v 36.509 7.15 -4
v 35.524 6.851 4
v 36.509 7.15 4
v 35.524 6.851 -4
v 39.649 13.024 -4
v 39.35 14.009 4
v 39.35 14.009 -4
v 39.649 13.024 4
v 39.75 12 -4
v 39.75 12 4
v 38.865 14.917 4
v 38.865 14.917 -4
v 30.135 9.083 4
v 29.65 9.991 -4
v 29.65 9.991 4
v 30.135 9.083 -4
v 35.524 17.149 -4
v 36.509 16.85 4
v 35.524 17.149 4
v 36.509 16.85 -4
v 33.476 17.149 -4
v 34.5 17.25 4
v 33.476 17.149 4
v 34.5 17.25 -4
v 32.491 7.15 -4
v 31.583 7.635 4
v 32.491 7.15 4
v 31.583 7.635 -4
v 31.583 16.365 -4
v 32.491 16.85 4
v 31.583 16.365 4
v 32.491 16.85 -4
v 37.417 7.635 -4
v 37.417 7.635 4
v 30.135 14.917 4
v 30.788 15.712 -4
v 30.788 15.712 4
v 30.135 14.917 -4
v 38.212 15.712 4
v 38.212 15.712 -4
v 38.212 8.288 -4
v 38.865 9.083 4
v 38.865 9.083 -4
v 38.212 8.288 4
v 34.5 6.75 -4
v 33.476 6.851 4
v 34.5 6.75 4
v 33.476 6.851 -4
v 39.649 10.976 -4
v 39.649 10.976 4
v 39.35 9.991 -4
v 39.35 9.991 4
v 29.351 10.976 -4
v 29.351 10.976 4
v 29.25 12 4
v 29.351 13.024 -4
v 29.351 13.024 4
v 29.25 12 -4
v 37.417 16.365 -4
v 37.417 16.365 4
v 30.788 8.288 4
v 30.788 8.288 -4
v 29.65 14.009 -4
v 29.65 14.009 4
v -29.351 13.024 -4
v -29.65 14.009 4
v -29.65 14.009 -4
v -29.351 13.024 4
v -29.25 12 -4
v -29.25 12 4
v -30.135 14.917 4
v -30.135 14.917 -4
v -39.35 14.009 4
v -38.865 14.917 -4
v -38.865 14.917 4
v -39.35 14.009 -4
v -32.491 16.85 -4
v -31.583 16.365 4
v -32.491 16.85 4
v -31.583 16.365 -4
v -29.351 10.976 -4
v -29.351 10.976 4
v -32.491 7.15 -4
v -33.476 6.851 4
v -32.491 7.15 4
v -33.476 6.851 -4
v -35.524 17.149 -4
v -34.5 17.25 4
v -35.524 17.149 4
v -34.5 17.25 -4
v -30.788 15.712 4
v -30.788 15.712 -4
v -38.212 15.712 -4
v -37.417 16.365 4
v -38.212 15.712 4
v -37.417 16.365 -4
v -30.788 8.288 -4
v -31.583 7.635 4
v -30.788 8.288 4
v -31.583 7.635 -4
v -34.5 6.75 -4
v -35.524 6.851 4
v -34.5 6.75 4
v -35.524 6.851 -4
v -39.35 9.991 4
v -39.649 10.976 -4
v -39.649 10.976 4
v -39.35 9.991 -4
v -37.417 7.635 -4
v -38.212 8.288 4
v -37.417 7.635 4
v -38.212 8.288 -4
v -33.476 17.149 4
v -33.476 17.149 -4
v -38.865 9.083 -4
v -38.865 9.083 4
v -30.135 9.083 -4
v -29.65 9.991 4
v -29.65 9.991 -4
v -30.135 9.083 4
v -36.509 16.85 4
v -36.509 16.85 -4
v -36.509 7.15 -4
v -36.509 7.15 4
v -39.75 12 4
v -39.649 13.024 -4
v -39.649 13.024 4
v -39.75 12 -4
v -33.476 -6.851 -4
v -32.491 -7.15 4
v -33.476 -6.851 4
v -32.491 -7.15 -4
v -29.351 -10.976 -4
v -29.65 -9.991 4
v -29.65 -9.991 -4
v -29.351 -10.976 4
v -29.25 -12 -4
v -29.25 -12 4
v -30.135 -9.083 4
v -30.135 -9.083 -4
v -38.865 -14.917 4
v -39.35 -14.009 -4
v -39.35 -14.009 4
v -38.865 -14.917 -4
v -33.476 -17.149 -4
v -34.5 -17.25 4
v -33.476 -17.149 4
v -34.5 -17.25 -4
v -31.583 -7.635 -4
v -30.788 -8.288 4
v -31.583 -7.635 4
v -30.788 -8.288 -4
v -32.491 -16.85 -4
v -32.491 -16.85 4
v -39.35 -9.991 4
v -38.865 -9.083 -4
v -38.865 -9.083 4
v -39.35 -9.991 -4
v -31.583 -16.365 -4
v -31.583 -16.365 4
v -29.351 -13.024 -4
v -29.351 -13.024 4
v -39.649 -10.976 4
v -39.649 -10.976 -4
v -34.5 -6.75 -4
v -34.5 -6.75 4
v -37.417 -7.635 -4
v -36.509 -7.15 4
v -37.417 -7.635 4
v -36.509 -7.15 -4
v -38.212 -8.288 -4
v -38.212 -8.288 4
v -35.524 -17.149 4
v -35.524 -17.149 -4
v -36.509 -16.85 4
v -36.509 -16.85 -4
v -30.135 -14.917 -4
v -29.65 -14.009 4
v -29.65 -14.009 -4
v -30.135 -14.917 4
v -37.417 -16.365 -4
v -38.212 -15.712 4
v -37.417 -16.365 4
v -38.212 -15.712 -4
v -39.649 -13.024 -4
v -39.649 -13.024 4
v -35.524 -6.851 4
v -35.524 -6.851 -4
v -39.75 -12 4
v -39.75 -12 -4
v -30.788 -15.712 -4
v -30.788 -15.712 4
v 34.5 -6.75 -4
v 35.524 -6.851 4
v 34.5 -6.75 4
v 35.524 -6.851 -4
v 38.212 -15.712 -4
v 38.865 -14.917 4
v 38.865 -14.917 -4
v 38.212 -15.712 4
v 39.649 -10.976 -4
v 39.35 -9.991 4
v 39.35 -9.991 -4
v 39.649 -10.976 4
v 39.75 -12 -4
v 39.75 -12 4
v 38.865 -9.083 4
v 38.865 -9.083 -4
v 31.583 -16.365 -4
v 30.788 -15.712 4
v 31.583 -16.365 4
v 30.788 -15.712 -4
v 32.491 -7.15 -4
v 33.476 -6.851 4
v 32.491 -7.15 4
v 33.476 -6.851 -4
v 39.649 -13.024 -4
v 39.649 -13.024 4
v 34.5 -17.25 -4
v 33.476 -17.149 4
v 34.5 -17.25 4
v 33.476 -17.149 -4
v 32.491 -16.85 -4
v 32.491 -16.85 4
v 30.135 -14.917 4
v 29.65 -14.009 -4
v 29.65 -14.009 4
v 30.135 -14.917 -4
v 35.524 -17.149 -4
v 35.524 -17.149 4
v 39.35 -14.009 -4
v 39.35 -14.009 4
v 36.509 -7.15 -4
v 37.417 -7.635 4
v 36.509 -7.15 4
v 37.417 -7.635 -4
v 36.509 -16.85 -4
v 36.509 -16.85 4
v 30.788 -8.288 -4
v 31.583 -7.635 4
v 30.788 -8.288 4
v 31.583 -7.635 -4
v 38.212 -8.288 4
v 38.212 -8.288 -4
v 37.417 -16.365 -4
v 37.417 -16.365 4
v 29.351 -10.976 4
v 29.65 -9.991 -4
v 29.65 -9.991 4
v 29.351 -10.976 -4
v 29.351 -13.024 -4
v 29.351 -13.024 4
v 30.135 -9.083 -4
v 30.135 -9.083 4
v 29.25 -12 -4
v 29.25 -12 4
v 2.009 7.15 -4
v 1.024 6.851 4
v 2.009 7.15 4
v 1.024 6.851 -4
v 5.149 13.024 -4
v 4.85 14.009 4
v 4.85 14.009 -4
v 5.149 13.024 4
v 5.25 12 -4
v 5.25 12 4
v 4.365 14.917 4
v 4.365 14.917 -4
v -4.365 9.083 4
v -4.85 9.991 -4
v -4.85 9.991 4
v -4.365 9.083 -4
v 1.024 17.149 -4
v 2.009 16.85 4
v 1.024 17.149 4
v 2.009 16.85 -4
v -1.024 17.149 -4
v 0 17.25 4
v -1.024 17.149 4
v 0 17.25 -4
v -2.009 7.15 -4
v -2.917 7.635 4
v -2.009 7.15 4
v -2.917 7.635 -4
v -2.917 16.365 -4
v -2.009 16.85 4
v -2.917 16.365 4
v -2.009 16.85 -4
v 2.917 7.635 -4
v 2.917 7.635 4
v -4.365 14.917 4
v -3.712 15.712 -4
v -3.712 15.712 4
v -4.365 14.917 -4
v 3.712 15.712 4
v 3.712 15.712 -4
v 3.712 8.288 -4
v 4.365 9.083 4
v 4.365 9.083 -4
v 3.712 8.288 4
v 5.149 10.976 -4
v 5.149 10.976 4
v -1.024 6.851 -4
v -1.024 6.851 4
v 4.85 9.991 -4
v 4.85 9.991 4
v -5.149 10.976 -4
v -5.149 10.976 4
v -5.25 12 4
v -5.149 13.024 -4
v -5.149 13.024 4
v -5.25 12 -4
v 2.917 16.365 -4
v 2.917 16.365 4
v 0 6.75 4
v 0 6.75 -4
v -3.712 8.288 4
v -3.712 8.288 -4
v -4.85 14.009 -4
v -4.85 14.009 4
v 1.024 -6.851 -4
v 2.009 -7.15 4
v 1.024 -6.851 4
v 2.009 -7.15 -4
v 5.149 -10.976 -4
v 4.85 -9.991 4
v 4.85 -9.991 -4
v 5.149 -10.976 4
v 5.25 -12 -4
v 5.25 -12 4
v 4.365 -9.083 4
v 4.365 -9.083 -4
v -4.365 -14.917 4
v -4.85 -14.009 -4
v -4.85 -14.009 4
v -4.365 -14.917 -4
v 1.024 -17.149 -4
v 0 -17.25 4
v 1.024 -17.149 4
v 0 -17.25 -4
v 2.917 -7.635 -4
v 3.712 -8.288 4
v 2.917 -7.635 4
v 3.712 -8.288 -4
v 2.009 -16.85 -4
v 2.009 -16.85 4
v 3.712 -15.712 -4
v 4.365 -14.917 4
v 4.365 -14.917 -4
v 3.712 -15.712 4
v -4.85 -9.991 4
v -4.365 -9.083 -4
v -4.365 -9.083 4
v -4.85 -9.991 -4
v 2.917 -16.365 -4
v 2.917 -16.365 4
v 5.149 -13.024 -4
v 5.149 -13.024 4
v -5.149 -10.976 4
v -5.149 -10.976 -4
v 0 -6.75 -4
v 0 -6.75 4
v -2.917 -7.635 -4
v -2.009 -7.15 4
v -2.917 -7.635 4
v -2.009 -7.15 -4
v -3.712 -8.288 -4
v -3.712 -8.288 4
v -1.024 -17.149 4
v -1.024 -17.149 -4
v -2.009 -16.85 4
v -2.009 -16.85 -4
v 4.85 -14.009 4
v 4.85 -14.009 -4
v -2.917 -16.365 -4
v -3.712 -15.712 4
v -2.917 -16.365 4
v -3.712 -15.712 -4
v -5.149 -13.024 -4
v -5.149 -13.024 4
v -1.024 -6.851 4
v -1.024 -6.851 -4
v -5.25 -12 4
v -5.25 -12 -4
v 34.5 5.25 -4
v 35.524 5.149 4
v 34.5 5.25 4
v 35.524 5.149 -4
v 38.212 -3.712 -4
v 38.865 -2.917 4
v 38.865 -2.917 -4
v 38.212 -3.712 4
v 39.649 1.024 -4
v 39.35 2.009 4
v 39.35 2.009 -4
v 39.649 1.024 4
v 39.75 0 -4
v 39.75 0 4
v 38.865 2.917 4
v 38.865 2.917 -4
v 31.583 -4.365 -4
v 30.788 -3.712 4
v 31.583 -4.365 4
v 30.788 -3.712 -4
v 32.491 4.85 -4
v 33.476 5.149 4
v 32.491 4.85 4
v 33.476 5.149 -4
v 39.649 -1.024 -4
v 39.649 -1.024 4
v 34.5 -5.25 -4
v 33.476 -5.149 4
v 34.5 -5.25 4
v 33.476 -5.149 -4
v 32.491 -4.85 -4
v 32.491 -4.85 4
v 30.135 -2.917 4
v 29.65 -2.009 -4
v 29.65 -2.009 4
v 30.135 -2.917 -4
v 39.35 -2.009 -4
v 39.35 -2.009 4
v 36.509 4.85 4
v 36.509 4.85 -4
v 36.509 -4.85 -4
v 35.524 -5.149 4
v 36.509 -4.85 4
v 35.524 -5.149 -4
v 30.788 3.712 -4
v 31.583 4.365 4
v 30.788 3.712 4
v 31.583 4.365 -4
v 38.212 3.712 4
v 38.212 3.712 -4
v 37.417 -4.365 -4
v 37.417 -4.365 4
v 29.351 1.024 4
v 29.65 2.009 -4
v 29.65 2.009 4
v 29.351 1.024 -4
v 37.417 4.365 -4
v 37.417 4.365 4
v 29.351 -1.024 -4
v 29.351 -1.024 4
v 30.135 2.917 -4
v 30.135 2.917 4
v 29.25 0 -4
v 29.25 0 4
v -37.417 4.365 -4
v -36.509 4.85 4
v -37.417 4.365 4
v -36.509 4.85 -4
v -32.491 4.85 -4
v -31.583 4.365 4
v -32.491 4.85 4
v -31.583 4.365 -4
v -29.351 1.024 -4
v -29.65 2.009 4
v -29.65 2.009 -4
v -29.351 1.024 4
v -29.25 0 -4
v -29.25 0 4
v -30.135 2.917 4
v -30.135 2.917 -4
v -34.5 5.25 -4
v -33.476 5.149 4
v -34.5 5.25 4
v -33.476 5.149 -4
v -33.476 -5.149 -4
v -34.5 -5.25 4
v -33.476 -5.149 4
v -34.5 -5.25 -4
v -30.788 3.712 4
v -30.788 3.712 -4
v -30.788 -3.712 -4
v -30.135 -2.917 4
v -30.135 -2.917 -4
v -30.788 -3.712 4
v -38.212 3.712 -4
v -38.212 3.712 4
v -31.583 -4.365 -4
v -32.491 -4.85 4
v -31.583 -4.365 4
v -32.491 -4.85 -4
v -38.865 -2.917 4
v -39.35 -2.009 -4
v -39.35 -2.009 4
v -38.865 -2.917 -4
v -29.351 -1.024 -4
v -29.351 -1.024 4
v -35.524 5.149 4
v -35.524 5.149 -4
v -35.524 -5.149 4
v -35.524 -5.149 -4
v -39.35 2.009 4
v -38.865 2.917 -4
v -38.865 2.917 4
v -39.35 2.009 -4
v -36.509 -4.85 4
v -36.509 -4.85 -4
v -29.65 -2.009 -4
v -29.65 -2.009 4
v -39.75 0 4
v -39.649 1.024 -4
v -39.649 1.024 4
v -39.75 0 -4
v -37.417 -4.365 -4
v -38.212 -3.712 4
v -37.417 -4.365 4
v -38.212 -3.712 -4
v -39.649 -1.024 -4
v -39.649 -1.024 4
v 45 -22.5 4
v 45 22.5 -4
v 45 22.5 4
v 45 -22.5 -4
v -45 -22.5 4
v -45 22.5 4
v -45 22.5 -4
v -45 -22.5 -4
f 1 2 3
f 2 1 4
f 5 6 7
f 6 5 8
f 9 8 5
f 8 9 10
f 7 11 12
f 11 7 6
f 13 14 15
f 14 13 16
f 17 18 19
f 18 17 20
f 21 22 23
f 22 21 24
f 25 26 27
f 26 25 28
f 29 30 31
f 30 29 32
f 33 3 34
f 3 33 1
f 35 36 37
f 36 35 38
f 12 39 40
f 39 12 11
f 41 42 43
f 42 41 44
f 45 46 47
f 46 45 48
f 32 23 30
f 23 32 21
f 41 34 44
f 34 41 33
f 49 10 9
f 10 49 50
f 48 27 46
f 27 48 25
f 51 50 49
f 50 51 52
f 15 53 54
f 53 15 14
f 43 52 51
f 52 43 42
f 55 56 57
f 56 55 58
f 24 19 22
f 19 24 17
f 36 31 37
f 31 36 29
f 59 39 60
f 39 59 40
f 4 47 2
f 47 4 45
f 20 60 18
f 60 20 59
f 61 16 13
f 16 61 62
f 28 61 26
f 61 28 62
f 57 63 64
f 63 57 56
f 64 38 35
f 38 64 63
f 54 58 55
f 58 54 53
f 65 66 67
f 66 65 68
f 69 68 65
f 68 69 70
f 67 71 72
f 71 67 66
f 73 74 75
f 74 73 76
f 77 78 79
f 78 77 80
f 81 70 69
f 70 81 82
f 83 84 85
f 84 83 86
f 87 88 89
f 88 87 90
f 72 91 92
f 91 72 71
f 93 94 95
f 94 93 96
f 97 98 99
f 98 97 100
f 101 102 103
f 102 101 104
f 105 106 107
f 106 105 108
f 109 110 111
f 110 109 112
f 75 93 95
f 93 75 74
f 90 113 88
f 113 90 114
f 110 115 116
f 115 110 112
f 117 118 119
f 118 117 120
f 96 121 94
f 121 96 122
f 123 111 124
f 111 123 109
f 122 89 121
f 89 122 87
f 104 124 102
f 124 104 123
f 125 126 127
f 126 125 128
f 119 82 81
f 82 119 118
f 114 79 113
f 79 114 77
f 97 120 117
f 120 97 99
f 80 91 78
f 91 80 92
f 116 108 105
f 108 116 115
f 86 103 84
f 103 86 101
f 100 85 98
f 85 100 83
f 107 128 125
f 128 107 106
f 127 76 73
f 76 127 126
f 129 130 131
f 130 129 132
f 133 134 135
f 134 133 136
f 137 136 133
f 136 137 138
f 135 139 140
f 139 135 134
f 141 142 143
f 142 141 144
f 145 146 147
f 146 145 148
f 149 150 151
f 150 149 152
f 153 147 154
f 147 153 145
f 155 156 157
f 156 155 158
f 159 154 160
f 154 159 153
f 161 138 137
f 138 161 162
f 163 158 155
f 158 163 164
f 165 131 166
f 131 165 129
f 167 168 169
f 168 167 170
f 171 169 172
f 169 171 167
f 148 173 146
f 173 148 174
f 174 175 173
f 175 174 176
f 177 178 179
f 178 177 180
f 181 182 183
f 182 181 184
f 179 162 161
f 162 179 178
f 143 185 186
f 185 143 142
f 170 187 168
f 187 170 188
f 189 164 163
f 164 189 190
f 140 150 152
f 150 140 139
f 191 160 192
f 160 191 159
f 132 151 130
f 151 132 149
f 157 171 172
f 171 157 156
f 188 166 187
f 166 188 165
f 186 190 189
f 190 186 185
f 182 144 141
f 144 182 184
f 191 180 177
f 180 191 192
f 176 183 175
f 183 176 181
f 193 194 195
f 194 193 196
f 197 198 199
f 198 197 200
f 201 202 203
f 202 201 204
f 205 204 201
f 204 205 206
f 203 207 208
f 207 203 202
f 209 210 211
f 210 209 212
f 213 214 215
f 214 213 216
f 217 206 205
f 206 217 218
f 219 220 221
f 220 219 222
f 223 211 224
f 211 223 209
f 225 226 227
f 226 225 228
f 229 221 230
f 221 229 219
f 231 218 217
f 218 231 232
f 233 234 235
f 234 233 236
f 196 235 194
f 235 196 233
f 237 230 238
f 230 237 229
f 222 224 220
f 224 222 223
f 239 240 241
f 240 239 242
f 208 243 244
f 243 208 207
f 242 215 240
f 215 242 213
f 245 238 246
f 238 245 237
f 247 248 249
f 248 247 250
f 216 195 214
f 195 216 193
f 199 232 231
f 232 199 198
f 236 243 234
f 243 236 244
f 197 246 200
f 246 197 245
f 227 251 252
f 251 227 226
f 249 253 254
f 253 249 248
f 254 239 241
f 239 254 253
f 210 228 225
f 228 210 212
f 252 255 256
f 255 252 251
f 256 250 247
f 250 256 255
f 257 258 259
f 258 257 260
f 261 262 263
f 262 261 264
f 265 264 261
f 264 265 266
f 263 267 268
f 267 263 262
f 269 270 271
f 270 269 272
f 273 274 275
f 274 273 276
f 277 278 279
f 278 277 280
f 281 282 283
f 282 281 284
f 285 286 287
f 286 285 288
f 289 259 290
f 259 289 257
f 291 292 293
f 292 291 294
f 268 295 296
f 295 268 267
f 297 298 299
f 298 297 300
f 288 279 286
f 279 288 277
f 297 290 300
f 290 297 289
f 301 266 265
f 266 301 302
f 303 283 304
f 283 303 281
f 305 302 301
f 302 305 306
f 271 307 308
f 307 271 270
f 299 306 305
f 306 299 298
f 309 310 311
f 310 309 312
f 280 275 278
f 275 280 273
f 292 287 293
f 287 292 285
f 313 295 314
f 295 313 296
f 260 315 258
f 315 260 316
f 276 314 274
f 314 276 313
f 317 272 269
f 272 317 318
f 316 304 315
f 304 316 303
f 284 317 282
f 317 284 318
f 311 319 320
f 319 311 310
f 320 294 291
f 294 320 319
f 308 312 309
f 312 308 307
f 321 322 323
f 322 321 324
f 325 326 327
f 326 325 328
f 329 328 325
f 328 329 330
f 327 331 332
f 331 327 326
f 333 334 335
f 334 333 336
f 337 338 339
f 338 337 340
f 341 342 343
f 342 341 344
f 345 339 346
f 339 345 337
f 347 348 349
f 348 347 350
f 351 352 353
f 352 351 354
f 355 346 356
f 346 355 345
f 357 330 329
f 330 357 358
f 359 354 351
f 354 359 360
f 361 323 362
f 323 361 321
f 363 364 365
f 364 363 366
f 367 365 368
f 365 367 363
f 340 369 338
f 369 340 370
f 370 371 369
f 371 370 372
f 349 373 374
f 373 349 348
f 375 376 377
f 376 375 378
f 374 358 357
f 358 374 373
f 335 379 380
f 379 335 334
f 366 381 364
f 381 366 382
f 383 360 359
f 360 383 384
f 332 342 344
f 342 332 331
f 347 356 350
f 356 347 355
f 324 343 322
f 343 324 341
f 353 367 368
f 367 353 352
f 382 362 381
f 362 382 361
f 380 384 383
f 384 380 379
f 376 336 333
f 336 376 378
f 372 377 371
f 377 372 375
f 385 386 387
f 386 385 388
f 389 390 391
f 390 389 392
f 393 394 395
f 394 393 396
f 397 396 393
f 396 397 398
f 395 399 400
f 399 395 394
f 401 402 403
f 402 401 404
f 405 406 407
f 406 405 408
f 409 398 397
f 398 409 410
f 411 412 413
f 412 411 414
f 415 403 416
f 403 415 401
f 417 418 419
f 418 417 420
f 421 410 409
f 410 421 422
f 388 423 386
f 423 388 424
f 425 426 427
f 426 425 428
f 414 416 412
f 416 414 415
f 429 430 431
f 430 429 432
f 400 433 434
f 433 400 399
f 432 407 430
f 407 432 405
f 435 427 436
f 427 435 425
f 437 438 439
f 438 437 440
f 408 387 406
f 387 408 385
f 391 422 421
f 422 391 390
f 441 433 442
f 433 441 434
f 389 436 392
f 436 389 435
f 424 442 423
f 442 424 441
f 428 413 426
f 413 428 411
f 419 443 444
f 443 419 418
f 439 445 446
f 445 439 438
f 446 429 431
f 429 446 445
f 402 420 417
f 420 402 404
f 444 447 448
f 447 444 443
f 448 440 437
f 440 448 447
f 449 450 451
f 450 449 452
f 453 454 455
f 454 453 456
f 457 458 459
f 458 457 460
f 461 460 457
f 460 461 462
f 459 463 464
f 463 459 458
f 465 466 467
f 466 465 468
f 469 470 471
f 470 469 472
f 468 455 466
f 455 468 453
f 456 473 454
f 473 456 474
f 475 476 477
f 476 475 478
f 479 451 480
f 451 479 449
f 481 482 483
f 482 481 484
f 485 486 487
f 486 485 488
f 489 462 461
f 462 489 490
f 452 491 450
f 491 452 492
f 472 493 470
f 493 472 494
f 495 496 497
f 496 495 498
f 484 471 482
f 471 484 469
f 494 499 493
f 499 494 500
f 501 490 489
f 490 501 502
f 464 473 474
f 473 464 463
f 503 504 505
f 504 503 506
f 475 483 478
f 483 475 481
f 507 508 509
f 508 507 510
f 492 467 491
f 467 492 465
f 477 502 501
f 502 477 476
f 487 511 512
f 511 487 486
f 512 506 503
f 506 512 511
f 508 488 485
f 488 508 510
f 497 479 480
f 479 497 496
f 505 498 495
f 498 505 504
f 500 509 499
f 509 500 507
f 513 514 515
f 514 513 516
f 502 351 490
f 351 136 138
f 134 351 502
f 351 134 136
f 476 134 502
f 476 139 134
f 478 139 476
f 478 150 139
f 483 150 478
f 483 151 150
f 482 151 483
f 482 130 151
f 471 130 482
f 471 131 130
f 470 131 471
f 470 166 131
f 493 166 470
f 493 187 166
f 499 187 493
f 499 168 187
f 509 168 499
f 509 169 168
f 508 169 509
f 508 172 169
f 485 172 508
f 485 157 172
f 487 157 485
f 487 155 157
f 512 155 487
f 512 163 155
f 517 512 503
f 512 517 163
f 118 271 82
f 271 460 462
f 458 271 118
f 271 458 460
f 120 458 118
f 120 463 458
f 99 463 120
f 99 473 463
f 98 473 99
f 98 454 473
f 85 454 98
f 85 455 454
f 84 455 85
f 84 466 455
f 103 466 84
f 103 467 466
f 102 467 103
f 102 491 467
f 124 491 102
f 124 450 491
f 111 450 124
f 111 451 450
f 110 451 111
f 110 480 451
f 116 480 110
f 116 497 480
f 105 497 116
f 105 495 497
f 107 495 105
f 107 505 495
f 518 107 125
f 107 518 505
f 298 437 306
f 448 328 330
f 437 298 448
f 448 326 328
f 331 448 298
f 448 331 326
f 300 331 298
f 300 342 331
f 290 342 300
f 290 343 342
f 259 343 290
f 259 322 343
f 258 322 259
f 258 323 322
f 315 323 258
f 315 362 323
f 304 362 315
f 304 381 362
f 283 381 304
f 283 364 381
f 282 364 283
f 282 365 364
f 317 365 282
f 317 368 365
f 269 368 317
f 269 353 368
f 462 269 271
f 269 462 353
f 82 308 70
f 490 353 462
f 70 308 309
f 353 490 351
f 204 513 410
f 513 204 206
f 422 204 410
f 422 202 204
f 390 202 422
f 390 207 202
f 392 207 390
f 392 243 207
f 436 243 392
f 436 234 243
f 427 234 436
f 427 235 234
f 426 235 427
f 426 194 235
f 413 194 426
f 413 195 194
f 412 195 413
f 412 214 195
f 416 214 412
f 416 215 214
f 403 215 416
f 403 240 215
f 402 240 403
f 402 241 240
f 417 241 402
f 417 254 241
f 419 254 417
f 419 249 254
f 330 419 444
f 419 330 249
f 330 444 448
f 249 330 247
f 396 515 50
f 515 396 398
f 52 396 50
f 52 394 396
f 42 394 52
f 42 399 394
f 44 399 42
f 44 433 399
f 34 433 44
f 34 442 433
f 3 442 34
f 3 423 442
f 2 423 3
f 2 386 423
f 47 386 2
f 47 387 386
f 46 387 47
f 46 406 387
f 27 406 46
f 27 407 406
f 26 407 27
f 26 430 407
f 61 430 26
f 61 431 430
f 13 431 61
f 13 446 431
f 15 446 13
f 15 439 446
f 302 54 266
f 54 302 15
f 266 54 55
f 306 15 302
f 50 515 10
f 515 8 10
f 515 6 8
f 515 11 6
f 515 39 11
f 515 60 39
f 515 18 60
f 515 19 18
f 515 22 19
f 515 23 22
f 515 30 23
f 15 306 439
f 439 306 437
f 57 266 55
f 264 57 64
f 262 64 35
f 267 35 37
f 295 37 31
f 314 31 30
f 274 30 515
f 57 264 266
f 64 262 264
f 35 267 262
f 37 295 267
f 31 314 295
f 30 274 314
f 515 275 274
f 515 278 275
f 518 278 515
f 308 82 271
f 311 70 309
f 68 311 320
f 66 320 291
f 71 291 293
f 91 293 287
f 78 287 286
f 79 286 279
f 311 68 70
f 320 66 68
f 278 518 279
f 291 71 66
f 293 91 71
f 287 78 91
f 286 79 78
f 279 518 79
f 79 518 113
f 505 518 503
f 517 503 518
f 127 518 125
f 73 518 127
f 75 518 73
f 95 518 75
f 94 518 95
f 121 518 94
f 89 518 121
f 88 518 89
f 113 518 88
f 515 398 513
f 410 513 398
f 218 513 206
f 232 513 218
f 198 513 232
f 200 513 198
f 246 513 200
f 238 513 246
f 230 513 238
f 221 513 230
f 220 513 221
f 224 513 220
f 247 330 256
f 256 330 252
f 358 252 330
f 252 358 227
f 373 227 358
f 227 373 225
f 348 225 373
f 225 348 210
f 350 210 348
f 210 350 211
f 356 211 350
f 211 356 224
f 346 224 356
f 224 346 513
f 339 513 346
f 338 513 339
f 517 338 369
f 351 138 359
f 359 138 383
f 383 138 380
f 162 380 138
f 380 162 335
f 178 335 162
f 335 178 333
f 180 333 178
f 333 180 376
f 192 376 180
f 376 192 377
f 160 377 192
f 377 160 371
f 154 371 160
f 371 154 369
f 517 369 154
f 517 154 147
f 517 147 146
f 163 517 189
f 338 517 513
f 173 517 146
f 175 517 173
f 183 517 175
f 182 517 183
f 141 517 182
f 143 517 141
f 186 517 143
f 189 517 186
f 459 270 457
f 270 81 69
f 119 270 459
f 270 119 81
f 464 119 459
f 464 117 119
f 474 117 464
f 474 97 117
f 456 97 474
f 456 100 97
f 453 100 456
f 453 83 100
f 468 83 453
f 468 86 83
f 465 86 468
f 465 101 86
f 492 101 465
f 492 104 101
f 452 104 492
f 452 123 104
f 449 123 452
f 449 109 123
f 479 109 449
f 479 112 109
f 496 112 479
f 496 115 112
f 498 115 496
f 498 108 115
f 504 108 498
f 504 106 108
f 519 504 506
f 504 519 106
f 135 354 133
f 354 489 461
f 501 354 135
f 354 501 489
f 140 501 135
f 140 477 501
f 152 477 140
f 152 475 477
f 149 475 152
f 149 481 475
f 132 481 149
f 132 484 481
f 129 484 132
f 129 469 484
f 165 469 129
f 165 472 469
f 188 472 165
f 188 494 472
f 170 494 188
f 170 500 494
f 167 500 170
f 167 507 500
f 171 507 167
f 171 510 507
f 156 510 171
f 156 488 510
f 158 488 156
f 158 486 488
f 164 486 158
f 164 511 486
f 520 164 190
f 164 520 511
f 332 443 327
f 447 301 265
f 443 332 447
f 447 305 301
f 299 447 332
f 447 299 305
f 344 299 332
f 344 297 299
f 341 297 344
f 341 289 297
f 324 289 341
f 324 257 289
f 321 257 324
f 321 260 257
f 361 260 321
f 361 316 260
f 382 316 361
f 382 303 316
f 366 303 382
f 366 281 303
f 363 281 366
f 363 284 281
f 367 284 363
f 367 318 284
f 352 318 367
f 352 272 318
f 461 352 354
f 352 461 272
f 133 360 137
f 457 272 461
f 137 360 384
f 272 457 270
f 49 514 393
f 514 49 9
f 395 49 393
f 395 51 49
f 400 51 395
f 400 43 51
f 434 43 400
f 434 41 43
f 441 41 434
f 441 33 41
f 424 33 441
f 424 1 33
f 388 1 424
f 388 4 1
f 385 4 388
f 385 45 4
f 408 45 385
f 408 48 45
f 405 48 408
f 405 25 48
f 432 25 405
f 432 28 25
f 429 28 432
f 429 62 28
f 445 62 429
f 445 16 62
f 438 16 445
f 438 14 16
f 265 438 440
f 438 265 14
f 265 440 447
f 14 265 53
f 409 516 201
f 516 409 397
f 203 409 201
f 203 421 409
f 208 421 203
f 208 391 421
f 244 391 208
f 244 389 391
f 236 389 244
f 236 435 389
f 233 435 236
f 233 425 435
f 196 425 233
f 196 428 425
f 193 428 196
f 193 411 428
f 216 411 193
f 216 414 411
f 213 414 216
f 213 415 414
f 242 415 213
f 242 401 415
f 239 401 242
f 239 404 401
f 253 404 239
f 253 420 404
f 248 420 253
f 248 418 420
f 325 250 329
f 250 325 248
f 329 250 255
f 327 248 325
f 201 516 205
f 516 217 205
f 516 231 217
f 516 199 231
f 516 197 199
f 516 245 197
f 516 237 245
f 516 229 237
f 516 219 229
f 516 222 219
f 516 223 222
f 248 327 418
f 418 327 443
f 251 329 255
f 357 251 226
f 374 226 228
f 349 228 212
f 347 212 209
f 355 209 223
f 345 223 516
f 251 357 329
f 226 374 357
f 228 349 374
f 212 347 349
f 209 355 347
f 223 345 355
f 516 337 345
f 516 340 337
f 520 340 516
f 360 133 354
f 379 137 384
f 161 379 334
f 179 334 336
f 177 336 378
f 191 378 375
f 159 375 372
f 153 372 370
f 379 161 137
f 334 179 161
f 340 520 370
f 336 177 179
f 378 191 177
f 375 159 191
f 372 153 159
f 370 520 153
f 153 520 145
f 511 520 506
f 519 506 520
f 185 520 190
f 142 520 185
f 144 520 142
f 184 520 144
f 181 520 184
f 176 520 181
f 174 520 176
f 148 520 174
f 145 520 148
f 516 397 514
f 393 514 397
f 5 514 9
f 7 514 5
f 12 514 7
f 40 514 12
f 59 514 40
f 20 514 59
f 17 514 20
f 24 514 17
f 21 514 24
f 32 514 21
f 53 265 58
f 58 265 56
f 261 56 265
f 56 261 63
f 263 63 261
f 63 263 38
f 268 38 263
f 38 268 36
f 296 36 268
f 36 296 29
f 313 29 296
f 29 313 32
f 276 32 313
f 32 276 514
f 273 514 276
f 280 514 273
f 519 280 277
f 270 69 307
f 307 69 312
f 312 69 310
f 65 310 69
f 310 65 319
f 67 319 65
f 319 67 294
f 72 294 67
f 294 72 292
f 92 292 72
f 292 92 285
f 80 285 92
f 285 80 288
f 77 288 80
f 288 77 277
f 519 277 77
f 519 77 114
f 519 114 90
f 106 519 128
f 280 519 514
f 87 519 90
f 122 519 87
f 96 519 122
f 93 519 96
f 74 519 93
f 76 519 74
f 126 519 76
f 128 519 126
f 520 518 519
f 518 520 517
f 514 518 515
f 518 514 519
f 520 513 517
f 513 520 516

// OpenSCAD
$fn = 32;

// ----------------------------------------------------------------------
// Corner plate 90 x 45 x 8
// 8 holes, centres taken from the edge offset
// ----------------------------------------------------------------------

// --- parameters (mm) ---
plate = [90, 45, 8];  // overall size (x, y, z)
seat_tol = 0.15;      // tolerance at the seating features
free_tol = 0.5;       // general tolerance on the free sizes
holes = 8;            // number of holes the drawing asks for
hole_d = 10.5;        // hole diameter
edge = 10.5;          // hole centre offset from the plate edge

// --- derived feature positions (mm) ---
corner_x = plate[0] / 2 - edge;  // = 34.5   corner hole X
corner_y = plate[1] / 2 - edge;  // = 12   corner hole Y
feature_centers = [
  [corner_x, corner_y],
  [-corner_x, corner_y],
  [-corner_x, -corner_y],
  [corner_x, -corner_y],
  [0, corner_y],
  [0, -corner_y],
  [corner_x, 0],
  [-corner_x, 0]
];   // hole centres the loop below drills

// plate outline, every hole drilled through with the same cutters
difference() {
  cube(plate, center = true);
  for (centre = feature_centers)
    translate([centre[0], centre[1], 0])
      cylinder(d = hole_d, h = plate[2] + 2, center = true);
}
